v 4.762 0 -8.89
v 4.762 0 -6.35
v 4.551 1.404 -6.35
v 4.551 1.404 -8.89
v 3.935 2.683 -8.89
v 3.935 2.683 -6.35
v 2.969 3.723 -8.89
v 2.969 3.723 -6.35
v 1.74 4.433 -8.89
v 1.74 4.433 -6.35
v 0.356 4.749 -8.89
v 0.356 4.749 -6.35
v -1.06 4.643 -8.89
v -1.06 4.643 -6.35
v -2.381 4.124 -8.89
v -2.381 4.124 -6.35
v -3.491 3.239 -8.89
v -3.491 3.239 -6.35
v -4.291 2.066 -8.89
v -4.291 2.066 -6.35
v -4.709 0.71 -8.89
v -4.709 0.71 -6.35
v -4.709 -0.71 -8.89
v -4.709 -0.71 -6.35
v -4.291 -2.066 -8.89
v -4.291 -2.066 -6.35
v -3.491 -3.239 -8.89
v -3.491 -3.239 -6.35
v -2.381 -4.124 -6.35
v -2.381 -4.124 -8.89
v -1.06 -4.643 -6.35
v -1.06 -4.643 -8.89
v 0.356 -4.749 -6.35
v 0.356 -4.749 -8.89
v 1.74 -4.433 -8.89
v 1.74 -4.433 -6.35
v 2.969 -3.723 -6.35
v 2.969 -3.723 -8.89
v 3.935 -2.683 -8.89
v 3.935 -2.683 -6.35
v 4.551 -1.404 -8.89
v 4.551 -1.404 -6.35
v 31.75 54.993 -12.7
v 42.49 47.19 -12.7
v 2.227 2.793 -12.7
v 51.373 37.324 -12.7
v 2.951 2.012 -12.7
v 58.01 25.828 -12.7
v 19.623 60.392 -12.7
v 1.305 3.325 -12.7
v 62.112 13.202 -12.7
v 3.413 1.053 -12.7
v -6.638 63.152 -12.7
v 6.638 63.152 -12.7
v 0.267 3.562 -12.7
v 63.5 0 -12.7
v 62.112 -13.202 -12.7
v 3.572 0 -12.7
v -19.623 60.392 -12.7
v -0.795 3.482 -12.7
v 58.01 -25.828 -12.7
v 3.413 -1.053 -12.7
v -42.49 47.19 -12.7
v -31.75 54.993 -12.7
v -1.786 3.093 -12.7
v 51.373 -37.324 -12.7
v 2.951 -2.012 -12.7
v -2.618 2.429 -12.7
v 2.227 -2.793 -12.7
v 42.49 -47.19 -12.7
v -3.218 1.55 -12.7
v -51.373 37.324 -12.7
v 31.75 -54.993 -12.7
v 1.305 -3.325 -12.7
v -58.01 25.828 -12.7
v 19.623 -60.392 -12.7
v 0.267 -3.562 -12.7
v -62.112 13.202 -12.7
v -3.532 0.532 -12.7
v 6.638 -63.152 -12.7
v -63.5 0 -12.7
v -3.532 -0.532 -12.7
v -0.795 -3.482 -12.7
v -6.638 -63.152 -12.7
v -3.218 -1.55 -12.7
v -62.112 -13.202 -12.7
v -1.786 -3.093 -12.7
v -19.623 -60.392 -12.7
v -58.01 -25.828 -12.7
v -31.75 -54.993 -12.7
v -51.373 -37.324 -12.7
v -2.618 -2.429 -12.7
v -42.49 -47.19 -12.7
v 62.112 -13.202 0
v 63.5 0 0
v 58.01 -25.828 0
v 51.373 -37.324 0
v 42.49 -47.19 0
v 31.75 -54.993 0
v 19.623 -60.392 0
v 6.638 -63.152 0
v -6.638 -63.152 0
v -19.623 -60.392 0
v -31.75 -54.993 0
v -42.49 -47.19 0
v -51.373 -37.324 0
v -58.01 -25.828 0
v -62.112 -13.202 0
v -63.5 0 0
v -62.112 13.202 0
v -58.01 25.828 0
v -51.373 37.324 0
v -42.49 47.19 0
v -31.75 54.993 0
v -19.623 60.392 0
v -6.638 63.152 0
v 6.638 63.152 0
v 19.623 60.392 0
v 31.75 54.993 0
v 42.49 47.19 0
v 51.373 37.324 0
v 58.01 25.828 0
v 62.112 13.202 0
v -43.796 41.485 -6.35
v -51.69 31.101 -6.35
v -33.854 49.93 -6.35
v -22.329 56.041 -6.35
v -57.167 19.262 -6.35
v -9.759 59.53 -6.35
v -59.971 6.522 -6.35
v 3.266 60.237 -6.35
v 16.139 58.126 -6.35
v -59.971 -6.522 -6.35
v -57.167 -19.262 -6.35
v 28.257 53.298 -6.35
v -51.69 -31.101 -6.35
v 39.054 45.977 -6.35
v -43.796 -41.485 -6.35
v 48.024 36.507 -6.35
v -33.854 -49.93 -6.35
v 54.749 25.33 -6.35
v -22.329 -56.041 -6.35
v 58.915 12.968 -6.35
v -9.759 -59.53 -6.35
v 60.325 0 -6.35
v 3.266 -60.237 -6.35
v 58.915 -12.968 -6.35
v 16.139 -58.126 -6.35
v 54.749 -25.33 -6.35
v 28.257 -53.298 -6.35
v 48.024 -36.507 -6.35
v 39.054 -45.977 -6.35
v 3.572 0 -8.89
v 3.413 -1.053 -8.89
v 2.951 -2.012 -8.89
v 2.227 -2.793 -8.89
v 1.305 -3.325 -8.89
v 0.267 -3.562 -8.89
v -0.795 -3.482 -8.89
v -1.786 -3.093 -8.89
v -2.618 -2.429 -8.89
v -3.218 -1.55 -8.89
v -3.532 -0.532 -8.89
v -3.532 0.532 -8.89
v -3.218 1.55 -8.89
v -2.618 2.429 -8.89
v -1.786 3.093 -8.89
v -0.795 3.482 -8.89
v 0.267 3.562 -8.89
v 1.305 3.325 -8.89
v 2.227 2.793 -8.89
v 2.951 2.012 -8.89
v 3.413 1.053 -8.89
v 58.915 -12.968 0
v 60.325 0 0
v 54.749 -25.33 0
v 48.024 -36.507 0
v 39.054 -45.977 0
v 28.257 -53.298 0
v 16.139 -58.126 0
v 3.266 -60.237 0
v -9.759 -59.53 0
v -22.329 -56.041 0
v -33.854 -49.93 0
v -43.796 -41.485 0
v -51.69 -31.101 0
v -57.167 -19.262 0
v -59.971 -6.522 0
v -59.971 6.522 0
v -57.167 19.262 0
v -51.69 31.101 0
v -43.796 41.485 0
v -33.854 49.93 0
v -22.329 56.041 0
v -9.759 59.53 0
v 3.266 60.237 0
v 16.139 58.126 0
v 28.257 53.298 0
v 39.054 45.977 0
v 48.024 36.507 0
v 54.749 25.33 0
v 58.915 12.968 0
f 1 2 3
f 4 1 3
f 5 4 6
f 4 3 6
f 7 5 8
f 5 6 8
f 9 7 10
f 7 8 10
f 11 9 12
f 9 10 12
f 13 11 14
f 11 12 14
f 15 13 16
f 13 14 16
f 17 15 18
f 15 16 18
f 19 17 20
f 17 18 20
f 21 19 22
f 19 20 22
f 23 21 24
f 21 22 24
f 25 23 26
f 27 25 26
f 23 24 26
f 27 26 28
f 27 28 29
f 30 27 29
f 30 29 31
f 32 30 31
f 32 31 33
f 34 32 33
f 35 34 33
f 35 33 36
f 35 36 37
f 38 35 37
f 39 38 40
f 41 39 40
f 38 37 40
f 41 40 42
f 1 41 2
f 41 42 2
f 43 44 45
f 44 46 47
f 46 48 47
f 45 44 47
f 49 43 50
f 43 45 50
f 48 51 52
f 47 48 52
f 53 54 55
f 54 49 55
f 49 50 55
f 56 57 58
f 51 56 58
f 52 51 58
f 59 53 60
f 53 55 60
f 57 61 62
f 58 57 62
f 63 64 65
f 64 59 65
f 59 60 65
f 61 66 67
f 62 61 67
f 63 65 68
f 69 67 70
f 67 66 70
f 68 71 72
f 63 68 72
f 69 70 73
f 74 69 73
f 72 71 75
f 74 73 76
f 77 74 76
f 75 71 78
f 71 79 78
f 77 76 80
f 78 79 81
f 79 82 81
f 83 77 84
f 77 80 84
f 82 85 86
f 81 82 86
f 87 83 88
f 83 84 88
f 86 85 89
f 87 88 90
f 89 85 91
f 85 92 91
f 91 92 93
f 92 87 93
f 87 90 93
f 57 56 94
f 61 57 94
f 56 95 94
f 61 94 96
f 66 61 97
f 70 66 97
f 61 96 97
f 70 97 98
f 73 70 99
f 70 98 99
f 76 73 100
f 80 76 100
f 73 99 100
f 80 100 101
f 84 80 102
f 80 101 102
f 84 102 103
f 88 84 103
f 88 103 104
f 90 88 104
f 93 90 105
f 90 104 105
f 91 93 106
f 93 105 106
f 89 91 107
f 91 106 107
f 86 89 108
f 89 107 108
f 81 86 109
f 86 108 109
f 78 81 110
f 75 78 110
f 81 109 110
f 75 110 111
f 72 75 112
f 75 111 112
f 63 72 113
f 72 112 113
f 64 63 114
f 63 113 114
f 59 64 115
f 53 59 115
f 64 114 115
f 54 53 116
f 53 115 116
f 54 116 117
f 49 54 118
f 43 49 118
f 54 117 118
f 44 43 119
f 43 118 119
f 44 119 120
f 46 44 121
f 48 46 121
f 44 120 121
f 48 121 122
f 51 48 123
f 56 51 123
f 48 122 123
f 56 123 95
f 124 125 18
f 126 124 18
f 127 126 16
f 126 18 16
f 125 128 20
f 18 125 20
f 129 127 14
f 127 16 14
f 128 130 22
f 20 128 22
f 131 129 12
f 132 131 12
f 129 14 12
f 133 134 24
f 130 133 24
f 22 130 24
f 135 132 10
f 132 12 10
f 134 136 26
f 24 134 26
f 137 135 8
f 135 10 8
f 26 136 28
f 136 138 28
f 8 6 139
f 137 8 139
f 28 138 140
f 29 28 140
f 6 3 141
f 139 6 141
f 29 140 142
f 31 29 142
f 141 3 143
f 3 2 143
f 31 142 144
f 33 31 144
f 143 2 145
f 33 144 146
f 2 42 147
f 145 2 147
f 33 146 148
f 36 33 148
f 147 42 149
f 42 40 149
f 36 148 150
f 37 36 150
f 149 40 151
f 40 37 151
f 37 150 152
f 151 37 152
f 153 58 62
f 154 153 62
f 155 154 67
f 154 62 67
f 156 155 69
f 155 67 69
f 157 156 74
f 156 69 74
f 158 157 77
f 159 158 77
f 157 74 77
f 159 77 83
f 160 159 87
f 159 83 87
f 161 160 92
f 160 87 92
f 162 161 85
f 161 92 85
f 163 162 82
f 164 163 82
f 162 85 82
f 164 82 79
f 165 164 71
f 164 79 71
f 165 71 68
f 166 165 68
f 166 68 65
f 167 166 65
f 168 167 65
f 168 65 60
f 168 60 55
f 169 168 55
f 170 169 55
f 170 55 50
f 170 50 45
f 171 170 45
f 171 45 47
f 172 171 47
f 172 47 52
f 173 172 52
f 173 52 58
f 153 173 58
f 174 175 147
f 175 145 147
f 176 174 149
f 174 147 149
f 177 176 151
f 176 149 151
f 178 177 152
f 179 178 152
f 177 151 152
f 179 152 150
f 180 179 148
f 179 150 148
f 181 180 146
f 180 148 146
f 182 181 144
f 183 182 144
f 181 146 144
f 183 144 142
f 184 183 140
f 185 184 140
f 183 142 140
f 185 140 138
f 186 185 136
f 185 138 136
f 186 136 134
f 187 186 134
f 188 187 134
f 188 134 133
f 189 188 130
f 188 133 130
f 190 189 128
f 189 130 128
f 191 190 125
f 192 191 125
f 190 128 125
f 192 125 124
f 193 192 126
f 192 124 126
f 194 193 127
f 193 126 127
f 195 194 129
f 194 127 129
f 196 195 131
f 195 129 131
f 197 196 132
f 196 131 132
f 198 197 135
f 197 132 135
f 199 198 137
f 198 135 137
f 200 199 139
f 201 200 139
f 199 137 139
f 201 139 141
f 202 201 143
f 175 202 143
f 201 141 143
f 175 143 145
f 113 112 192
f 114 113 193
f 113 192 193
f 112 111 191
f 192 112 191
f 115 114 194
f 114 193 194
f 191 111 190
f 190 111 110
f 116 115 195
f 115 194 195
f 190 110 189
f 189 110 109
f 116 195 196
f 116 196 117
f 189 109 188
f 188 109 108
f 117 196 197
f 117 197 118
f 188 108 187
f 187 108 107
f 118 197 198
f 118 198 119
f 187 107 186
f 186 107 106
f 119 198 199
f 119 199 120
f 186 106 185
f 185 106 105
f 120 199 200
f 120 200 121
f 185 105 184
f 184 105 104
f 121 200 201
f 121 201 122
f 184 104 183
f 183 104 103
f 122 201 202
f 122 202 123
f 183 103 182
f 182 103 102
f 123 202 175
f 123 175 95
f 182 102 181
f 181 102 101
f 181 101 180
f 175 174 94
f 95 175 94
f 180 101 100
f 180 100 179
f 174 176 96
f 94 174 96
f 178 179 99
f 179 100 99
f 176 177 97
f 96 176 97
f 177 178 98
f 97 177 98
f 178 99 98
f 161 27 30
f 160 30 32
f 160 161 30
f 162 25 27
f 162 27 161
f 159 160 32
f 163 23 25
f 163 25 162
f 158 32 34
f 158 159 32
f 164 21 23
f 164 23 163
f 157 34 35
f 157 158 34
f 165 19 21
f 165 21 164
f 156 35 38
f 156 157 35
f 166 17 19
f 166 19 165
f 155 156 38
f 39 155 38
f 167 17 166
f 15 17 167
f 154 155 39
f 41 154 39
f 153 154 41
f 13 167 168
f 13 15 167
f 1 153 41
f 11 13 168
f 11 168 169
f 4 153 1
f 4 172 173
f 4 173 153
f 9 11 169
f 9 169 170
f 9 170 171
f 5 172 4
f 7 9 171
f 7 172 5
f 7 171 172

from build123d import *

# Parameters (mm, degrees)
CUT_EXTRUDE1_REACH             = 92.696
SKETCH3_R                      = 3.571875
CUT_EXTRUDE1_DIRECTION_2_DEPTH = 91.696141042
SKETCH4_R                      = 4.7625
CUT_EXTRUDE2_DEPTH             = 2.54


with BuildPart() as part:
    # Sketch2 → Revolve1 (revolve)
    with BuildSketch(Plane(origin=(0, 0, 0), x_dir=(0, 0, -1), z_dir=(1, 0, 0)), mode=Mode.PRIVATE) as revolve1_sk:
        Polygon((0, 63.5), (0, 60.325), (6.35, 60.325), (6.35, 0), (12.7, 0), (12.7, 63.5), align=None)
    revolve(revolve1_sk.sketch.rotate(Axis((0, 0, 40.533532934), (0, 0, -1)), 90), axis=Axis((0, 0, 40.533532934), (0, 0, -1)))

    # Sketch3 → Cut-Extrude1 (cut, up to next)
    with BuildSketch(Plane(origin=(0, 0, -12.7), x_dir=(-1, 0, 0), z_dir=(0, 0, -1)), mode=Mode.PRIVATE) as cut_extrude1_sk1:
        with Locations(Location((0, 0, 0), (0, 0, 180))):
            Circle(SKETCH3_R)
    cut_extrude1_tool1 = extrude(cut_extrude1_sk1.sketch, amount=-CUT_EXTRUDE1_REACH, mode=Mode.PRIVATE) & part.part
    add(cut_extrude1_tool1.solids().sort_by_distance((0, 0, -12.7))[0], mode=Mode.SUBTRACT)

    # Sketch3 → Cut-Extrude1 direction 2 (cut)
    with BuildSketch(Plane(origin=(0, 0, -12.7), x_dir=(-1, 0, 0), z_dir=(0, 0, -1))):
        with Locations(Location((0, 0, 0), (0, 0, 180))):
            Circle(SKETCH3_R)
    extrude(amount=CUT_EXTRUDE1_DIRECTION_2_DEPTH, mode=Mode.SUBTRACT)

    # Sketch4 → Cut-Extrude2 (cut)
    with BuildSketch(Plane.XY.offset(-6.35)):
        Circle(SKETCH4_R)
    extrude(amount=-CUT_EXTRUDE2_DEPTH, mode=Mode.SUBTRACT)


solid = part.part
